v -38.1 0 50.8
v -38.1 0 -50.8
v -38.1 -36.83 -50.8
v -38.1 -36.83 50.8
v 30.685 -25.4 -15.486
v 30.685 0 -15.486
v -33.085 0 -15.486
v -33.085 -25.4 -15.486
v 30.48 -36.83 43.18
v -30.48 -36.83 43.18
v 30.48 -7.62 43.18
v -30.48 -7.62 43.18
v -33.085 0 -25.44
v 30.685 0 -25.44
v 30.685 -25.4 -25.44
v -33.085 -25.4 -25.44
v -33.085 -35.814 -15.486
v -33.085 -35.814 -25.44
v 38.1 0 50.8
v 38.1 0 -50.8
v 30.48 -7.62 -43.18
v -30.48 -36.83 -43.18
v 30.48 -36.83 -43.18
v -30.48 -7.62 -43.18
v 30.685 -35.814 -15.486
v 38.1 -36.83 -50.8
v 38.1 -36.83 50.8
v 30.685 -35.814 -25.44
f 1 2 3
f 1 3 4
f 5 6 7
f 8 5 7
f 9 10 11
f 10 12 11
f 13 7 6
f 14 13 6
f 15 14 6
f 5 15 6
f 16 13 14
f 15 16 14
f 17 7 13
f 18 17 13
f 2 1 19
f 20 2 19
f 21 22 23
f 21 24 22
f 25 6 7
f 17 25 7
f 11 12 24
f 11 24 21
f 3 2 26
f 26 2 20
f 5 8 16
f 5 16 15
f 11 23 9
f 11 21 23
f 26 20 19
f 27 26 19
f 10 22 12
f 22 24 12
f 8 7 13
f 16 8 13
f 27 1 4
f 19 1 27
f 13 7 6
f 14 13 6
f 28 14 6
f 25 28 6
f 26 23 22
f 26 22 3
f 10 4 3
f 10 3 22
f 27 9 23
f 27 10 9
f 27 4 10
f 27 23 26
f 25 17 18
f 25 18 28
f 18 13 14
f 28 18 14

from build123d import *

# Parameters (mm, degrees)
F0_W     = 76.2
F0_H     = 101.6
F1_DEPTH = 36.83
F2_T     = -7.62
F4_DEPTH = 25.4
F5_DEPTH = 35.814


with BuildPart() as f1:
    # F0 (on Front) → F1 (new body)
    with BuildSketch(Plane.XZ):
        Rectangle(F0_W, F0_H)
    extrude(amount=F1_DEPTH)

    # F2
    f2_openings = [f1.faces().sort_by_distance(p)[0] for p in [
        (0, -36.83, 0),
    ]]
    offset(amount=F2_T, openings=f2_openings)


with BuildPart() as f4:
    # F3 (on Front) → F4 (new body)
    with BuildSketch(Plane.XZ):
        Polygon((30.685341, -15.485806), (-30.602904, -15.485806), (-33.085197, -15.485806), (-33.085197, -25.44005), (30.685341, -25.44005), align=None)
    extrude(amount=F4_DEPTH)


with BuildPart() as f5:
    # F3 (on Front) → F5 (new body)
    with BuildSketch(Plane.XZ):
        Polygon((30.685341, -15.485806), (-30.602904, -15.485806), (-33.085197, -15.485806), (-33.085197, -25.44005), (30.685341, -25.44005), align=None)
    extrude(amount=F5_DEPTH)


solid = Compound([f1.part, f4.part, f5.part])
